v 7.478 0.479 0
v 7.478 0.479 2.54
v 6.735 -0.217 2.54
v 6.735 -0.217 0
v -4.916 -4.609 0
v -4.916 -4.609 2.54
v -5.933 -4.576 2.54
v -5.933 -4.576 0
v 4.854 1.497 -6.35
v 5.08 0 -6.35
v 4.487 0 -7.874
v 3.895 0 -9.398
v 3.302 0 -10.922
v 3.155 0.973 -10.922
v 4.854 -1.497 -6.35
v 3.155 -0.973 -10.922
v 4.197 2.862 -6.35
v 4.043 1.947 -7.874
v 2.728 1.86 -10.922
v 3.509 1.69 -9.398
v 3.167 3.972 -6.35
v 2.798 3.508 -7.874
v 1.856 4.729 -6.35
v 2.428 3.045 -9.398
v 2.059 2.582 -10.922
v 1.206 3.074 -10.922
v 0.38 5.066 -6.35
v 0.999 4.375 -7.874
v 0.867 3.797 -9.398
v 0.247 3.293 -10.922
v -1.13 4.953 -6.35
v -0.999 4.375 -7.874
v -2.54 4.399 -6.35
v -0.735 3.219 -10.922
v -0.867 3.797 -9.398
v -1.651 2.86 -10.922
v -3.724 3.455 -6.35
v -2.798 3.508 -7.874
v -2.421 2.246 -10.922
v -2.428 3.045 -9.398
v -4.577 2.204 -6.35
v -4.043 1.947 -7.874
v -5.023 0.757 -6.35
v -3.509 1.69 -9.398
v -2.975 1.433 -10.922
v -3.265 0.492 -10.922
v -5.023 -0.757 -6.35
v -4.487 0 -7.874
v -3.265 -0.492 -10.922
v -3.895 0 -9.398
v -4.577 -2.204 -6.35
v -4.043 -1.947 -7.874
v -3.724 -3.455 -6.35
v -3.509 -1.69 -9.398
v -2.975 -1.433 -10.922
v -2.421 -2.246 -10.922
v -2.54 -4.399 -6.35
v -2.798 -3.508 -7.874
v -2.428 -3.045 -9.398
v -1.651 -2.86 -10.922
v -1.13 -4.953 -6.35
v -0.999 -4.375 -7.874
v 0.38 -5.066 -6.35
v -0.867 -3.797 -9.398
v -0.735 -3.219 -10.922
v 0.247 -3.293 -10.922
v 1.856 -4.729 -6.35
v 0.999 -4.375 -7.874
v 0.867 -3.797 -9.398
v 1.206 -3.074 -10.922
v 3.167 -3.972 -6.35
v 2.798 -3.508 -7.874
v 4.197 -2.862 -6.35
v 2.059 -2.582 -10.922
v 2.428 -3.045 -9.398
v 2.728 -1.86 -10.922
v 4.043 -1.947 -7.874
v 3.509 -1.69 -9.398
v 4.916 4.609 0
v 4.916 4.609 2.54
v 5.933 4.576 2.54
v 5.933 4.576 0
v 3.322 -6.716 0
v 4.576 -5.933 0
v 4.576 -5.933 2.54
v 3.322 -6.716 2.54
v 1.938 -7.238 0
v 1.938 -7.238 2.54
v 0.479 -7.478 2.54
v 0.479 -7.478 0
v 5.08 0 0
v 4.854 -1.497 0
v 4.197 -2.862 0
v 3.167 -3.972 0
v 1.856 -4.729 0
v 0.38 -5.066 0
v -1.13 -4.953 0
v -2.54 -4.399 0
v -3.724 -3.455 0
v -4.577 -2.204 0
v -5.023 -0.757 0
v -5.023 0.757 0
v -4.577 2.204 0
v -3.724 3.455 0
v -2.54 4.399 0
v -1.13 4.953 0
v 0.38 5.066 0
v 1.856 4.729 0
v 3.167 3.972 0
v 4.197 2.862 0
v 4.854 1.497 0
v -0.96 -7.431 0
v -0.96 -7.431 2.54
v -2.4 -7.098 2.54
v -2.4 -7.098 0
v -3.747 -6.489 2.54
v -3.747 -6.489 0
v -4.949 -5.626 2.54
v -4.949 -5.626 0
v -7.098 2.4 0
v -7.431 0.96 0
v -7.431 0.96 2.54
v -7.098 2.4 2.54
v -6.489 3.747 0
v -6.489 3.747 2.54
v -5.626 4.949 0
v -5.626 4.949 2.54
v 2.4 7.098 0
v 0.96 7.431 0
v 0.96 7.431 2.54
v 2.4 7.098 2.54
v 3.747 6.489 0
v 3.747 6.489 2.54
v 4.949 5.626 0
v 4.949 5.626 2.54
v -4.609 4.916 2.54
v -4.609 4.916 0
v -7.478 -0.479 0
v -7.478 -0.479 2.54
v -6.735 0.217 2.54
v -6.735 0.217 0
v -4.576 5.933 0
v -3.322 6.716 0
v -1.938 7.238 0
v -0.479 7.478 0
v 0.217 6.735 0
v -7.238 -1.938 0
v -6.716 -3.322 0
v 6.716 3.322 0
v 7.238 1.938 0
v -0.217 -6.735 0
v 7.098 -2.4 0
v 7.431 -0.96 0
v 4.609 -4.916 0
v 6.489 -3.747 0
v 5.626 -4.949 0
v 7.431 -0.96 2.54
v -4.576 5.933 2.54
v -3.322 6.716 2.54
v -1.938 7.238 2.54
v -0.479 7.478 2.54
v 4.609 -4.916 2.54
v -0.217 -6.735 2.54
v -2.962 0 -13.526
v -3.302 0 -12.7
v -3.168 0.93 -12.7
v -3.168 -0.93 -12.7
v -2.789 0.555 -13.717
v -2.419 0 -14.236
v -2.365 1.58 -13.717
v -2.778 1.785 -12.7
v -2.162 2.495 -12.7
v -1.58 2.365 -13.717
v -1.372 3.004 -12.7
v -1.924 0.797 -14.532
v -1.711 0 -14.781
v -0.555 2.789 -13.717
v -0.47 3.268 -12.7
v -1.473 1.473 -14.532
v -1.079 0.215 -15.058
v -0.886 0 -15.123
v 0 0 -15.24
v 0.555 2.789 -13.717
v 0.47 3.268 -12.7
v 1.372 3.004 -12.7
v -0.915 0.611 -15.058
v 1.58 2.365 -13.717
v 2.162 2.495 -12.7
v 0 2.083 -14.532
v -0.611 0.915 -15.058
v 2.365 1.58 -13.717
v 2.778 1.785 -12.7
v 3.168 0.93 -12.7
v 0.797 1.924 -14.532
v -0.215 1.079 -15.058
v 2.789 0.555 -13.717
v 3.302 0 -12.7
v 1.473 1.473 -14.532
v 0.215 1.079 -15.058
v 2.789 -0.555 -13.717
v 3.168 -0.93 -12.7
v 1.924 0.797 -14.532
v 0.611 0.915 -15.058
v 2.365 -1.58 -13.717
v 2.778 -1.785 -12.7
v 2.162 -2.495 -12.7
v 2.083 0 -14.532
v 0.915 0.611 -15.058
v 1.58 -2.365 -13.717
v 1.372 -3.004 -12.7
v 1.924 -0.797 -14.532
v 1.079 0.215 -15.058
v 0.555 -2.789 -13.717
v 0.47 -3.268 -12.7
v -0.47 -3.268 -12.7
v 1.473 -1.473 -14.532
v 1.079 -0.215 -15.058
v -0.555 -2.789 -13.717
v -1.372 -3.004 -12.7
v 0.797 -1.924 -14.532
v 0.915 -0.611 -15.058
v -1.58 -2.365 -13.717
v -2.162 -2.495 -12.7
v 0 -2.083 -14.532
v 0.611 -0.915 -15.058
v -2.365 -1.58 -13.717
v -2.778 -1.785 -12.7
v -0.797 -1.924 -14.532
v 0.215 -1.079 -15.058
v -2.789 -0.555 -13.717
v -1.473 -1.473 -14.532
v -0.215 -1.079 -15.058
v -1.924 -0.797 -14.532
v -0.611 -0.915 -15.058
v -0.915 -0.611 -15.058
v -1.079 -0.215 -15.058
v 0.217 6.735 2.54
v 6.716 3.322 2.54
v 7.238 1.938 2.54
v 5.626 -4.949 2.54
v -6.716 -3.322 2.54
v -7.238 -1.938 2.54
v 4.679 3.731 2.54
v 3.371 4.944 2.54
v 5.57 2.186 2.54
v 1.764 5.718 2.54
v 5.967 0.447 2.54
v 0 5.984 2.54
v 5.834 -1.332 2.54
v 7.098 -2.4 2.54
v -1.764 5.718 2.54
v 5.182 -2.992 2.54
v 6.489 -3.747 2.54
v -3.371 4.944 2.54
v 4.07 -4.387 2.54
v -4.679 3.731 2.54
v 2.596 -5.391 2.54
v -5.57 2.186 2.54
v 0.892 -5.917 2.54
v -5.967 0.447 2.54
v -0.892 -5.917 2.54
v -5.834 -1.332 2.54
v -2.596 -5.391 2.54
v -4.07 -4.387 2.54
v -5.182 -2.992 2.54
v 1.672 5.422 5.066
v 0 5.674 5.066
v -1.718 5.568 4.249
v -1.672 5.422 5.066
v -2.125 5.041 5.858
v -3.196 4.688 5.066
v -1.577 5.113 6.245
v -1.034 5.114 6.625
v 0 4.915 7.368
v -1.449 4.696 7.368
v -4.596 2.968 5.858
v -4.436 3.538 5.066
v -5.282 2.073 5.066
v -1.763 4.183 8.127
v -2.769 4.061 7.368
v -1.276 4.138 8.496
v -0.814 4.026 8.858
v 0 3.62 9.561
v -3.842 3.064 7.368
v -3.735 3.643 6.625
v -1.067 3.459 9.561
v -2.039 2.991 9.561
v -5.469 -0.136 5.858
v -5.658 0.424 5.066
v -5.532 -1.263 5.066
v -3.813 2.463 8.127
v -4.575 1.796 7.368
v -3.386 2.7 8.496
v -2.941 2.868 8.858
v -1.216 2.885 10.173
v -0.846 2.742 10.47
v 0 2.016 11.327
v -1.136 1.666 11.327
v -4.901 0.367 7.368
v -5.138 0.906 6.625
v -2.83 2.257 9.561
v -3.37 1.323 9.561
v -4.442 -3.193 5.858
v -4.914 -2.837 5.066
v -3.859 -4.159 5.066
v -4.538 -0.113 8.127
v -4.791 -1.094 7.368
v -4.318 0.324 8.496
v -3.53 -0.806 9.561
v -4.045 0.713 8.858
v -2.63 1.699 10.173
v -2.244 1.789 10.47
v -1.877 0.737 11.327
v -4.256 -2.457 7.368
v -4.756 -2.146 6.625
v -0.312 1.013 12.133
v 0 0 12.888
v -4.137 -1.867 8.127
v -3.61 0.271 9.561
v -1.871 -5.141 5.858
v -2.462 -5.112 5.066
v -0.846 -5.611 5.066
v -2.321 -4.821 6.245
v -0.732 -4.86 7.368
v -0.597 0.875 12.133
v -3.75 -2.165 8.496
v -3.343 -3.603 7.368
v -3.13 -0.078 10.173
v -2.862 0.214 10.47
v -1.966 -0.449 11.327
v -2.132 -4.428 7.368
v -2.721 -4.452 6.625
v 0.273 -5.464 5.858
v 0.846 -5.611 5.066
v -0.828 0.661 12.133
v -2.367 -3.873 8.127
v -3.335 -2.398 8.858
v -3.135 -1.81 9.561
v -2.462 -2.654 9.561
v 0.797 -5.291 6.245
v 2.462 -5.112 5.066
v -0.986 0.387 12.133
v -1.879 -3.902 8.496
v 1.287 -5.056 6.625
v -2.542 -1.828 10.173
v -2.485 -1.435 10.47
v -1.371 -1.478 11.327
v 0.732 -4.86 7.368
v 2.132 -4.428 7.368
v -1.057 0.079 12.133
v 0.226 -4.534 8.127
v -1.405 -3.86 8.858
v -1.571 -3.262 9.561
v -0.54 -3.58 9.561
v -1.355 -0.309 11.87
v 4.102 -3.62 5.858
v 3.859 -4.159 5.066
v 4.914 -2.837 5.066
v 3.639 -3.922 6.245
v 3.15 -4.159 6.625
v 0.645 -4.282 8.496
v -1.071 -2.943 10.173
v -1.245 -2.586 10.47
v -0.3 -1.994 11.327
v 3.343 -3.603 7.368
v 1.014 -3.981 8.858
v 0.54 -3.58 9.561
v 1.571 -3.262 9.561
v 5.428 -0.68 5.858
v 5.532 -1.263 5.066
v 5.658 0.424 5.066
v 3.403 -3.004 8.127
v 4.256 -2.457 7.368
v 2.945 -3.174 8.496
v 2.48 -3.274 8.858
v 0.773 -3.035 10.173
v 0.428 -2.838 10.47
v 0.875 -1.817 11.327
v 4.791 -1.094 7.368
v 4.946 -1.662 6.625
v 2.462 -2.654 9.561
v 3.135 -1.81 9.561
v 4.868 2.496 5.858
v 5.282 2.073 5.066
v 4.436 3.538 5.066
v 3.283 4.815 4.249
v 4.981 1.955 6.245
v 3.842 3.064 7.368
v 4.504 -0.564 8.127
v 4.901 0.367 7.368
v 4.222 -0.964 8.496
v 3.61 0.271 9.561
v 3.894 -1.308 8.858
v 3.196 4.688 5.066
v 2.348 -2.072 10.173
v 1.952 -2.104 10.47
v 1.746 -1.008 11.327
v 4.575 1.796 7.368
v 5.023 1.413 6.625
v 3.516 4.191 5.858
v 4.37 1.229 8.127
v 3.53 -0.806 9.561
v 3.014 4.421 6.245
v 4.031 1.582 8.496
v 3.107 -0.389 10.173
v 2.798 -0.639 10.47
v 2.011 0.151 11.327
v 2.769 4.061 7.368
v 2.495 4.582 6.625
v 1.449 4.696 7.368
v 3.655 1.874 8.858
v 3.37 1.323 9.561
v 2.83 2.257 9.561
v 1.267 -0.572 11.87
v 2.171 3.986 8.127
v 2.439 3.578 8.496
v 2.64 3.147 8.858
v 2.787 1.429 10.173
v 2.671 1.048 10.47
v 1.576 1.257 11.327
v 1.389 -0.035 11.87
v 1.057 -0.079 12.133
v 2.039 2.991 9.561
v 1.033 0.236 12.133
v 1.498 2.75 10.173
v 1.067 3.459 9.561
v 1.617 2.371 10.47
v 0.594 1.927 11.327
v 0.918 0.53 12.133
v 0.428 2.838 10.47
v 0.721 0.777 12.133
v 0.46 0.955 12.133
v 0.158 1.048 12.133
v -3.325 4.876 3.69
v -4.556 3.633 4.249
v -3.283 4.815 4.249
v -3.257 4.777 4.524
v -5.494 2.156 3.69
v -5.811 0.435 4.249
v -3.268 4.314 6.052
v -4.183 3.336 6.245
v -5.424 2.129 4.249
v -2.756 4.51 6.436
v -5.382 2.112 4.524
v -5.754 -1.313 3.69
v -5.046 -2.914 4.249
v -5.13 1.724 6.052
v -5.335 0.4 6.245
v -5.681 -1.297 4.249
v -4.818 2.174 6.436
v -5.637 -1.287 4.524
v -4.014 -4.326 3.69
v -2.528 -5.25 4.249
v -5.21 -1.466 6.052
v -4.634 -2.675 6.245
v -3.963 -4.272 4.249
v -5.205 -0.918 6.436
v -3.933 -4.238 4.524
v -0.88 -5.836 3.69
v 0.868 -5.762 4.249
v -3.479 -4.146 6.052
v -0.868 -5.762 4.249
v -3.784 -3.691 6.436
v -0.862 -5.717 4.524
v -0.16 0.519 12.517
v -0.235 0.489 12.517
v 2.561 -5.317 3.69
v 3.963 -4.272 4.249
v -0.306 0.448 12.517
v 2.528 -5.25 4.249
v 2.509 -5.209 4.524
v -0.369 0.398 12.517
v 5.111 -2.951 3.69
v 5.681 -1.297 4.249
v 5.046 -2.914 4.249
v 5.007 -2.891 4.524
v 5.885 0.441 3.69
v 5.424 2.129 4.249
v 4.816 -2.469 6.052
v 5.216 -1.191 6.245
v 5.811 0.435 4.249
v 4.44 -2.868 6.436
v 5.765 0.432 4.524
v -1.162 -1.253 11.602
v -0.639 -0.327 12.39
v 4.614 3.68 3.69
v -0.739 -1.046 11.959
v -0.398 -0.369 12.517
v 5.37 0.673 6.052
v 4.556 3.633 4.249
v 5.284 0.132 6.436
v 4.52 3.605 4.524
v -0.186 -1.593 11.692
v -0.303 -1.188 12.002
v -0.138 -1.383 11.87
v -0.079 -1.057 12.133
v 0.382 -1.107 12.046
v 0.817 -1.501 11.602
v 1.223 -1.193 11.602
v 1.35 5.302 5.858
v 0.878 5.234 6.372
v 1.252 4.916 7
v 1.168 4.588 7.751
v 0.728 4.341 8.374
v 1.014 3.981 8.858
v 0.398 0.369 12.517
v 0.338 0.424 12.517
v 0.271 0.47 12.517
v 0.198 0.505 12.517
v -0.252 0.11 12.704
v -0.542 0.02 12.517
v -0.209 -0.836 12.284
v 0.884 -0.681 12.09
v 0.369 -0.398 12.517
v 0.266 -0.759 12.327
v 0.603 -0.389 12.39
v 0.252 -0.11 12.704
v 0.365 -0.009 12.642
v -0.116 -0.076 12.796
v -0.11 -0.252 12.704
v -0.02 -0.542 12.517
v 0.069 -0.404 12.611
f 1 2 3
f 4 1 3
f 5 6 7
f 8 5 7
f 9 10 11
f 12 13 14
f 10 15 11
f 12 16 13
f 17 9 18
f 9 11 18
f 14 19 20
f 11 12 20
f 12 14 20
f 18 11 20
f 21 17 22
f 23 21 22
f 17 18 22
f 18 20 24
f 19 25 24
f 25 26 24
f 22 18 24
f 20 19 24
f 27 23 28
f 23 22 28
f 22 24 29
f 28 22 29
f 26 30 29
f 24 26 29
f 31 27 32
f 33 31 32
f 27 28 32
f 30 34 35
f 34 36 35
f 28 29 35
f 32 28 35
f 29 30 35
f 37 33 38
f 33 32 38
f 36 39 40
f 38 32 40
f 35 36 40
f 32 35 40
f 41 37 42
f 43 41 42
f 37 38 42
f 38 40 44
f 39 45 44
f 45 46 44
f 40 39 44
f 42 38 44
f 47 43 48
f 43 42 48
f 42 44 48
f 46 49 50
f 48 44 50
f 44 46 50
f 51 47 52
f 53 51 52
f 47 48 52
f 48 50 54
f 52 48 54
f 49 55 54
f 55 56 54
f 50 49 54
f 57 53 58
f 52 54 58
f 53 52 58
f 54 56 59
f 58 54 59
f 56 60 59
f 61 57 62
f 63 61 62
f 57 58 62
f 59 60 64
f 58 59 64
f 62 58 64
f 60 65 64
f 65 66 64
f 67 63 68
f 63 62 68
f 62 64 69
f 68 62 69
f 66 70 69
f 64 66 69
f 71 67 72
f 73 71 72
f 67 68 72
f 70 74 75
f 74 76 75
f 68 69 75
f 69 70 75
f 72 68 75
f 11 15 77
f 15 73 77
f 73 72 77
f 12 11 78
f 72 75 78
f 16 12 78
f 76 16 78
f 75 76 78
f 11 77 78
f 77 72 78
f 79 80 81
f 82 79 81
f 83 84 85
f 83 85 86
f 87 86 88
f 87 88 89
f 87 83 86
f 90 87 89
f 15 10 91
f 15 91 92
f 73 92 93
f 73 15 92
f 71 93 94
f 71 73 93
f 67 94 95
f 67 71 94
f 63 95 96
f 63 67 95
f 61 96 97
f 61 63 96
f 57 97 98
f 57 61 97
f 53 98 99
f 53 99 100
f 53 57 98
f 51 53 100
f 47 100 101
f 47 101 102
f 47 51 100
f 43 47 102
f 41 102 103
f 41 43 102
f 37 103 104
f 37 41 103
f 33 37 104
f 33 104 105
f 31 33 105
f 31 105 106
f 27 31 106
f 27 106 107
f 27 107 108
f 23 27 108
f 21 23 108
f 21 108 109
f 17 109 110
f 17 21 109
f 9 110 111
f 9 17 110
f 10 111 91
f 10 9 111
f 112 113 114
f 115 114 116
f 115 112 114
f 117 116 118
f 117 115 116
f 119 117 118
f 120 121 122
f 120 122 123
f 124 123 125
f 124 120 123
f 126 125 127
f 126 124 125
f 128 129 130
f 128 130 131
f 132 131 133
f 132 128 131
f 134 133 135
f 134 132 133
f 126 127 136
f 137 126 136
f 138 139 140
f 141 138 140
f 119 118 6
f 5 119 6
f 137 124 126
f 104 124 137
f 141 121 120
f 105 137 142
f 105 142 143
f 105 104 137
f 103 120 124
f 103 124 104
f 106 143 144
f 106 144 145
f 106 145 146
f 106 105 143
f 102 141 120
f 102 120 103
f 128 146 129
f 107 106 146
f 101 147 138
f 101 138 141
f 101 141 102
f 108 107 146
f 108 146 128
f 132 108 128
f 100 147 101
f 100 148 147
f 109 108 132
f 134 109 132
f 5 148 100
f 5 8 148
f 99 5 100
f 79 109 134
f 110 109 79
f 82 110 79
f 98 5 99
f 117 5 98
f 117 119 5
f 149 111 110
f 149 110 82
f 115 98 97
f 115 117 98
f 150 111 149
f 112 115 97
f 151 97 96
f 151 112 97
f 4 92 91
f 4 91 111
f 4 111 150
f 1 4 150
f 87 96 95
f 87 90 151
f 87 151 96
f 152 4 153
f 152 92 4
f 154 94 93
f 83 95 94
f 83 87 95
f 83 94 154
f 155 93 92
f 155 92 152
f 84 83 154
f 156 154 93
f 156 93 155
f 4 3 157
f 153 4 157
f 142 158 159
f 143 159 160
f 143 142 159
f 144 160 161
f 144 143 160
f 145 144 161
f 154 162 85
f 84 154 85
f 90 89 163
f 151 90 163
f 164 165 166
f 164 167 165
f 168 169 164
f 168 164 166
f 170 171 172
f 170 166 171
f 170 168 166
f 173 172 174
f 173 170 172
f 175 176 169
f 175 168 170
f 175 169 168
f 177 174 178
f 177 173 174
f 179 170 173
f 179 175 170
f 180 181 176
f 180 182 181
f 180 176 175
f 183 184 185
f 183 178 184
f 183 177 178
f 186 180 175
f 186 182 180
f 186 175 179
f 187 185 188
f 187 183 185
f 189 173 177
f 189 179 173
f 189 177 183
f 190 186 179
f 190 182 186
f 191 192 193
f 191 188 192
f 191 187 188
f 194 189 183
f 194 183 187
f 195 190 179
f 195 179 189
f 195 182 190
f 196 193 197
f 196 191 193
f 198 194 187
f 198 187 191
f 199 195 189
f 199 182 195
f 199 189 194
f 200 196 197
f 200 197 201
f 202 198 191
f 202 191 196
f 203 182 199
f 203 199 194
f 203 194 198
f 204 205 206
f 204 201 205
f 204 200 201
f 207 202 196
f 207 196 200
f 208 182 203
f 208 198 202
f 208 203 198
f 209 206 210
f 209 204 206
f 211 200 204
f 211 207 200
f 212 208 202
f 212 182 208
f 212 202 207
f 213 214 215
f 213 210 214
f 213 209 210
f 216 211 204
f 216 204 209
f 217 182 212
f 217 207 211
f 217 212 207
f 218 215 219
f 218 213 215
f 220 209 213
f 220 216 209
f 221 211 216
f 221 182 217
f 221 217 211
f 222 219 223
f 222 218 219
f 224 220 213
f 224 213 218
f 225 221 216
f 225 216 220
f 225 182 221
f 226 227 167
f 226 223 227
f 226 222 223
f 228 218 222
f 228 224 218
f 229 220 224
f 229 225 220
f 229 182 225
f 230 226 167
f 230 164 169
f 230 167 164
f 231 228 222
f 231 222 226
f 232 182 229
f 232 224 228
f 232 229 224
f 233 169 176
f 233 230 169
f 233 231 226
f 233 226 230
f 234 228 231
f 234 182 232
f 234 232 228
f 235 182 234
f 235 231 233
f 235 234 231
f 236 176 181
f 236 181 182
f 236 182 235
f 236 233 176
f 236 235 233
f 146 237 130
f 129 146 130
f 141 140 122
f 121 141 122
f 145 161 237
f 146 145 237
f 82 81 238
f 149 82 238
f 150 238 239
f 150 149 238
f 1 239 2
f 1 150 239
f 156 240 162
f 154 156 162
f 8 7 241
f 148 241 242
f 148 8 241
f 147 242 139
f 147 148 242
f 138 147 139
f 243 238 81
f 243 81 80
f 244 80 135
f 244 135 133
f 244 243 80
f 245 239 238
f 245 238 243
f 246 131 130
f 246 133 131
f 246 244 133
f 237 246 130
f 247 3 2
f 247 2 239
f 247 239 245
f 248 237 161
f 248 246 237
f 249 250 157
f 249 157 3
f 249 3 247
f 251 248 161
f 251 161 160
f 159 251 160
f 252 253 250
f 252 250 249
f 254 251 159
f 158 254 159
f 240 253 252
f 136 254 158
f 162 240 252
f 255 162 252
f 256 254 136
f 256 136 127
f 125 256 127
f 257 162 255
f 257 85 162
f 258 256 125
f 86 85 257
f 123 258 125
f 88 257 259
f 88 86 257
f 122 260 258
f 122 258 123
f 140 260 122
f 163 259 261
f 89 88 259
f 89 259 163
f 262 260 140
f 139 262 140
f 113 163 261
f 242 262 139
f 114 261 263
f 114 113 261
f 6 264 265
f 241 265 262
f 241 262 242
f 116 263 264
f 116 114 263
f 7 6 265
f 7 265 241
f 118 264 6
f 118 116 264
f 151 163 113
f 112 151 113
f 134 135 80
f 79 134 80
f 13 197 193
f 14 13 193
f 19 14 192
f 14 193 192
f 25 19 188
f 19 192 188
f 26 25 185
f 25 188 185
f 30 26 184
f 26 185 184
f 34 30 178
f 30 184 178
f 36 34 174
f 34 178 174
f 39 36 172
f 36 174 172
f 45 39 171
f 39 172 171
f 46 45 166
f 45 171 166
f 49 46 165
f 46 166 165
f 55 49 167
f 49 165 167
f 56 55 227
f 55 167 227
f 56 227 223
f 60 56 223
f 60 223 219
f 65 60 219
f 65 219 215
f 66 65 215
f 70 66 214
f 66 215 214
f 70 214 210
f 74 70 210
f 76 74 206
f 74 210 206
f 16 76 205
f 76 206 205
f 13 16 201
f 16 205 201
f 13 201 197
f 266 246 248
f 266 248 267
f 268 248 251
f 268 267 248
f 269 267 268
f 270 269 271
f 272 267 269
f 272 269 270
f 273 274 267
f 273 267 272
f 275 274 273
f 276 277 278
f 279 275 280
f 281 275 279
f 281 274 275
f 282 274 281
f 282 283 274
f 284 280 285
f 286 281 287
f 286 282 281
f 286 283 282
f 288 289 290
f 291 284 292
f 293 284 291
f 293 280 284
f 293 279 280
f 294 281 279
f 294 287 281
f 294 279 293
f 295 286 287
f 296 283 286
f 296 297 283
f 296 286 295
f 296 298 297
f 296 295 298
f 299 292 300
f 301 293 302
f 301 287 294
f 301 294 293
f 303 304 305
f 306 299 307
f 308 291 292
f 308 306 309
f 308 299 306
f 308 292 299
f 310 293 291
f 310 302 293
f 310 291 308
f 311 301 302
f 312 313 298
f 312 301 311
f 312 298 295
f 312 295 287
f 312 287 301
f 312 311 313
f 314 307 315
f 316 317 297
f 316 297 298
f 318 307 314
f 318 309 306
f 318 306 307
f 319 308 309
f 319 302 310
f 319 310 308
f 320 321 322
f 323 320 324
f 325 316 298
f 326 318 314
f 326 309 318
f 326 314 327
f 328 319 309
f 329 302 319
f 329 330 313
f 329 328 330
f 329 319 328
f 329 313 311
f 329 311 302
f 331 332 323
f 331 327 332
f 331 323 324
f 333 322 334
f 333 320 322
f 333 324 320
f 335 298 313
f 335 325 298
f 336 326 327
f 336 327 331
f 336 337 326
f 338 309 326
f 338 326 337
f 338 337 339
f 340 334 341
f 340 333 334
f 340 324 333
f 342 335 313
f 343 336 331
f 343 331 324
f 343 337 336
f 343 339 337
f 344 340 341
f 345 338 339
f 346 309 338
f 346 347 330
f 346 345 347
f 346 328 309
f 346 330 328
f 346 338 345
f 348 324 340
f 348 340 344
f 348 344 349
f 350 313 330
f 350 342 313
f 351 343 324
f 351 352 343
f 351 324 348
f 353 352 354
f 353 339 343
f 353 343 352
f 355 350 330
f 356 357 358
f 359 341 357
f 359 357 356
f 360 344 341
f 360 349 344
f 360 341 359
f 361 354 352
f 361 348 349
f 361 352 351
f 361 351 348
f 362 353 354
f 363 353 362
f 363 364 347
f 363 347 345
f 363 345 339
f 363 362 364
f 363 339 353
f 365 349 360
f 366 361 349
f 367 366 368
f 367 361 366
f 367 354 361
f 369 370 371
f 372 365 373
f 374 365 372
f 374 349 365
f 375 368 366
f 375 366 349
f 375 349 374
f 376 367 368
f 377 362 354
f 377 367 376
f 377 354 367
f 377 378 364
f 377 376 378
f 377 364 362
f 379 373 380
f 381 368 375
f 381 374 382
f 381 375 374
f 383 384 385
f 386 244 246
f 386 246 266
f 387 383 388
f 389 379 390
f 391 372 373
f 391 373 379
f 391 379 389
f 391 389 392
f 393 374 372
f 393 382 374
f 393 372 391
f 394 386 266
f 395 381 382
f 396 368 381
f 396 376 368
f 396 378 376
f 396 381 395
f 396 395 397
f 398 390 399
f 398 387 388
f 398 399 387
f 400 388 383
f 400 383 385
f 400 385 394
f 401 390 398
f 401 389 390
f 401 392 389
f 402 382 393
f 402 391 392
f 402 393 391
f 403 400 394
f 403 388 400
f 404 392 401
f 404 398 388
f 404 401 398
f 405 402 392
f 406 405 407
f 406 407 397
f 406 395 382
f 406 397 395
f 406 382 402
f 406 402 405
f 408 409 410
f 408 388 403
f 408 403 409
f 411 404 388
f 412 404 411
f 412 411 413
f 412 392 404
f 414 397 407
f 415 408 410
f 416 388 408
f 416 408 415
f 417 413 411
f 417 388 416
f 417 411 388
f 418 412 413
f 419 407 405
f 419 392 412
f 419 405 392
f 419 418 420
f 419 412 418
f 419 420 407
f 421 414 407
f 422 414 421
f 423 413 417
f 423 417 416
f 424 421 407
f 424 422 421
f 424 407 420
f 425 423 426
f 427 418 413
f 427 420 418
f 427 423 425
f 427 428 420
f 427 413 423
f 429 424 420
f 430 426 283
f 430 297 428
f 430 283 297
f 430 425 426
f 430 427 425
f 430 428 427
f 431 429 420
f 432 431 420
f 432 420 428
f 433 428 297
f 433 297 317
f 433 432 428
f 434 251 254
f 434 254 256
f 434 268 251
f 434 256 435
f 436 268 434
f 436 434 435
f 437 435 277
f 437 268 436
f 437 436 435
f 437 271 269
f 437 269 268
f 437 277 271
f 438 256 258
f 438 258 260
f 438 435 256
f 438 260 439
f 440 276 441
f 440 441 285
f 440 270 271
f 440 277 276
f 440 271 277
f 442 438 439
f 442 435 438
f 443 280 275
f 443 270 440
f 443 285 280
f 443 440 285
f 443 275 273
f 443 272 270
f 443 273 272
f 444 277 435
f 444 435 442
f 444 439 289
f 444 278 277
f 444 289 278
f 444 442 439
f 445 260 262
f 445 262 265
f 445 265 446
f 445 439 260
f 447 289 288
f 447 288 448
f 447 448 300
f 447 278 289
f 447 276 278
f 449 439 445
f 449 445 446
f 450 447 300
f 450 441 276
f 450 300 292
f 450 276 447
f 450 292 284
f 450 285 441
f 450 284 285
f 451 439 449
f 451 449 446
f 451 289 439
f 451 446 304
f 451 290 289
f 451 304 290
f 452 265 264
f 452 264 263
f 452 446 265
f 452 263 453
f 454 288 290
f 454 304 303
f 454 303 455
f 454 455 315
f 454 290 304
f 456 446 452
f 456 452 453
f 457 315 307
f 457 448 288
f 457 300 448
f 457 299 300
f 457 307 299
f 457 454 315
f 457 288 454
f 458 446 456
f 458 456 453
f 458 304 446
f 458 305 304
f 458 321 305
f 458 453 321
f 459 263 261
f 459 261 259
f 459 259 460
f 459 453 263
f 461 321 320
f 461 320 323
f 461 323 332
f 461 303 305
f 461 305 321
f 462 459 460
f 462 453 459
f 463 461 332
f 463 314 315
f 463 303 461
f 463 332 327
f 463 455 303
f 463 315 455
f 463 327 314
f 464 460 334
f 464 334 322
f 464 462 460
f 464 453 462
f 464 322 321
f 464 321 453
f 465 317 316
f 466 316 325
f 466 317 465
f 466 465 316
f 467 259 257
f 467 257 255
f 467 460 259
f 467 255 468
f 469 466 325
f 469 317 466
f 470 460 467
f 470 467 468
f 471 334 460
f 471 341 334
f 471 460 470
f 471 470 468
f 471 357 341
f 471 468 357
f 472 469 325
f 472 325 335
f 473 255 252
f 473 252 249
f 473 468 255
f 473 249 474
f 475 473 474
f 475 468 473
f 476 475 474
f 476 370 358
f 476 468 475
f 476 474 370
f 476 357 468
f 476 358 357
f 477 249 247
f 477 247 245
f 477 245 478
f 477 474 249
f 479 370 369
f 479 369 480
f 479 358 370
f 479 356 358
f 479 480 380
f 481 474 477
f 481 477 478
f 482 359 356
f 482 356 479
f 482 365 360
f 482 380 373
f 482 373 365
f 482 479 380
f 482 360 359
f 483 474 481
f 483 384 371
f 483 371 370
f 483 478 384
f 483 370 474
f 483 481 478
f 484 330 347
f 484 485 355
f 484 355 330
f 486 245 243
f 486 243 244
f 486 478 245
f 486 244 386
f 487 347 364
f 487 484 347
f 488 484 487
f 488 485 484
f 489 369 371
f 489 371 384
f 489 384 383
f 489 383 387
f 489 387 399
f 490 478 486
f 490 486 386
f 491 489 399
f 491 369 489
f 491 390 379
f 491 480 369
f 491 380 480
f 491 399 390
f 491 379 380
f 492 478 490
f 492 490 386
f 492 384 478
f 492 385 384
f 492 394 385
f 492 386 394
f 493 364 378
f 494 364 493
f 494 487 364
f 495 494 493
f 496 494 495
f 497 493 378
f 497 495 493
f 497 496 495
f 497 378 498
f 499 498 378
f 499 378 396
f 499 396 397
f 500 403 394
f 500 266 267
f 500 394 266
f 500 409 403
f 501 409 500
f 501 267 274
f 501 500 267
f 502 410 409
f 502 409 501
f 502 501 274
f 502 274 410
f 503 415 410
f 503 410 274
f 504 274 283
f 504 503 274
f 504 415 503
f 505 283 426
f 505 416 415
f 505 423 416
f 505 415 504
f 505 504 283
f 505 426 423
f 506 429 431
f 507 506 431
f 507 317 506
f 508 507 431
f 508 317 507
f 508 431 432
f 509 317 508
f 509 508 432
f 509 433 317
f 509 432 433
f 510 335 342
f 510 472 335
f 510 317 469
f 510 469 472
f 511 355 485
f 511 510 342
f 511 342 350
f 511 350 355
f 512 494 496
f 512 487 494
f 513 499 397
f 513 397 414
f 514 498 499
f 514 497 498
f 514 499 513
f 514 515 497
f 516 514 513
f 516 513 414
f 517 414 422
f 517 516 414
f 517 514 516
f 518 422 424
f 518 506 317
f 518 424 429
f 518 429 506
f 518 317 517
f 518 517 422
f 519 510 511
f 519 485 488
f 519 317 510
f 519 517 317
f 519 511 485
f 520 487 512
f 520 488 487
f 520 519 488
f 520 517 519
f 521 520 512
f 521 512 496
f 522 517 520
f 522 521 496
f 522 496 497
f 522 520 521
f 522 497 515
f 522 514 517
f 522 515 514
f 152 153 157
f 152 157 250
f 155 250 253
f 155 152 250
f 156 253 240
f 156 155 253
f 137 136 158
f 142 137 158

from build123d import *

# Parameters (mm, degrees)
DOME1_FACE_RADIUS = 3.302
DOME1_HEIGHT      = 2.54
SEEDCUT_DEPTH     = 21.698272826
CIRPATTERN1_COUNT = 8


# Read off the part's stored shape, not the designer's step: Cut-Revolve-Thin4
with BuildPart() as part:
    # Sketch1 → Revolve1 (revolve)
    with BuildSketch(Plane(origin=(0, 0, 0), x_dir=(0, 0, -1), z_dir=(1, 0, 0)), mode=Mode.PRIVATE) as revolve1_sk:
        Polygon((-2.54, 0), (-2.54, 7.493), (0, 7.493), (0, 5.08), (12.7, 5.08), (12.7, 0), align=None)
    revolve(revolve1_sk.sketch.rotate(Axis((0, 0, 12.072762836), (0, 0, -1)), 90), axis=Axis((0, 0, 12.072762836), (0, 0, -1)))

    # Sketch3 → Revolve2 (revolve)
    with BuildSketch(Plane(origin=(0, 0, 0), x_dir=(0, 0, -1), z_dir=(1, 0, 0))):
        with BuildLine():
            Line((-12.887595566, 0), (-2.54, 0))
            Line((-2.54, 0), (-2.54, 5.984091271))
            add(Edge.make_bspline(
                [(-2.54, 5.984091271), (-9.10319215, 5.770912184), (-12.887595566, 0)],
                knots=[0, 0, 0, 1, 1, 1], degree=2))
        make_face()
    revolve(axis=Axis((0, 0, 12.072762836), (0, 0, 1)))

    # Cut-Revolve-Thin4 outline → Cut-Revolve-Thin4 (revolve, cut)
    with BuildSketch(Plane.XZ):
        Polygon((3.302, -10.922), (3.302, -12.7), (5.08, -12.7), (5.08, -6.35), align=None)
    revolve(axis=Axis((0, 0, 0), (0, 0, 1)), mode=Mode.SUBTRACT)

    # Dome1: a dome of height H over a round flat face of radius A is a cap of a sphere of radius (A * A + H * H) / (2 * H)
    dome1_r = (DOME1_FACE_RADIUS * DOME1_FACE_RADIUS + DOME1_HEIGHT * DOME1_HEIGHT) / (2 * DOME1_HEIGHT)
    dome1_base = Plane((0, 0, -12.7), z_dir=(0, 0, -1))
    with Locations(dome1_base.offset(DOME1_HEIGHT - dome1_r)):
        dome1_ball = Sphere(dome1_r, mode=Mode.PRIVATE)
    add(split(dome1_ball, bisect_by=dome1_base, keep=Keep.TOP, mode=Mode.PRIVATE))

    # Sketch6 → SeedCut (cut, through all)
    with BuildSketch(Plane.XY.offset(2.54)):
        with BuildLine():
            Line((0.217011402, 6.735050359), (0.959619925, 7.431297235))
            ThreePointArc((0.959619925, 7.431297235), (0.241308217, 7.489113388), (-0.479235475, 7.477658882))
            Line((-0.479235475, 7.477658882), (0.217011402, 6.735050359))
        make_face()
    seedcut = extrude(amount=-SEEDCUT_DEPTH, mode=Mode.SUBTRACT)

    # CirPattern1: SeedCut ×8 about axis
    cirpattern1_axis = Axis((0, 0, 0), (0, 0, 1))
    for i in range(1, CIRPATTERN1_COUNT):
        add(seedcut.rotate(cirpattern1_axis, i * 360 / CIRPATTERN1_COUNT), mode=Mode.SUBTRACT)


solid = part.part
